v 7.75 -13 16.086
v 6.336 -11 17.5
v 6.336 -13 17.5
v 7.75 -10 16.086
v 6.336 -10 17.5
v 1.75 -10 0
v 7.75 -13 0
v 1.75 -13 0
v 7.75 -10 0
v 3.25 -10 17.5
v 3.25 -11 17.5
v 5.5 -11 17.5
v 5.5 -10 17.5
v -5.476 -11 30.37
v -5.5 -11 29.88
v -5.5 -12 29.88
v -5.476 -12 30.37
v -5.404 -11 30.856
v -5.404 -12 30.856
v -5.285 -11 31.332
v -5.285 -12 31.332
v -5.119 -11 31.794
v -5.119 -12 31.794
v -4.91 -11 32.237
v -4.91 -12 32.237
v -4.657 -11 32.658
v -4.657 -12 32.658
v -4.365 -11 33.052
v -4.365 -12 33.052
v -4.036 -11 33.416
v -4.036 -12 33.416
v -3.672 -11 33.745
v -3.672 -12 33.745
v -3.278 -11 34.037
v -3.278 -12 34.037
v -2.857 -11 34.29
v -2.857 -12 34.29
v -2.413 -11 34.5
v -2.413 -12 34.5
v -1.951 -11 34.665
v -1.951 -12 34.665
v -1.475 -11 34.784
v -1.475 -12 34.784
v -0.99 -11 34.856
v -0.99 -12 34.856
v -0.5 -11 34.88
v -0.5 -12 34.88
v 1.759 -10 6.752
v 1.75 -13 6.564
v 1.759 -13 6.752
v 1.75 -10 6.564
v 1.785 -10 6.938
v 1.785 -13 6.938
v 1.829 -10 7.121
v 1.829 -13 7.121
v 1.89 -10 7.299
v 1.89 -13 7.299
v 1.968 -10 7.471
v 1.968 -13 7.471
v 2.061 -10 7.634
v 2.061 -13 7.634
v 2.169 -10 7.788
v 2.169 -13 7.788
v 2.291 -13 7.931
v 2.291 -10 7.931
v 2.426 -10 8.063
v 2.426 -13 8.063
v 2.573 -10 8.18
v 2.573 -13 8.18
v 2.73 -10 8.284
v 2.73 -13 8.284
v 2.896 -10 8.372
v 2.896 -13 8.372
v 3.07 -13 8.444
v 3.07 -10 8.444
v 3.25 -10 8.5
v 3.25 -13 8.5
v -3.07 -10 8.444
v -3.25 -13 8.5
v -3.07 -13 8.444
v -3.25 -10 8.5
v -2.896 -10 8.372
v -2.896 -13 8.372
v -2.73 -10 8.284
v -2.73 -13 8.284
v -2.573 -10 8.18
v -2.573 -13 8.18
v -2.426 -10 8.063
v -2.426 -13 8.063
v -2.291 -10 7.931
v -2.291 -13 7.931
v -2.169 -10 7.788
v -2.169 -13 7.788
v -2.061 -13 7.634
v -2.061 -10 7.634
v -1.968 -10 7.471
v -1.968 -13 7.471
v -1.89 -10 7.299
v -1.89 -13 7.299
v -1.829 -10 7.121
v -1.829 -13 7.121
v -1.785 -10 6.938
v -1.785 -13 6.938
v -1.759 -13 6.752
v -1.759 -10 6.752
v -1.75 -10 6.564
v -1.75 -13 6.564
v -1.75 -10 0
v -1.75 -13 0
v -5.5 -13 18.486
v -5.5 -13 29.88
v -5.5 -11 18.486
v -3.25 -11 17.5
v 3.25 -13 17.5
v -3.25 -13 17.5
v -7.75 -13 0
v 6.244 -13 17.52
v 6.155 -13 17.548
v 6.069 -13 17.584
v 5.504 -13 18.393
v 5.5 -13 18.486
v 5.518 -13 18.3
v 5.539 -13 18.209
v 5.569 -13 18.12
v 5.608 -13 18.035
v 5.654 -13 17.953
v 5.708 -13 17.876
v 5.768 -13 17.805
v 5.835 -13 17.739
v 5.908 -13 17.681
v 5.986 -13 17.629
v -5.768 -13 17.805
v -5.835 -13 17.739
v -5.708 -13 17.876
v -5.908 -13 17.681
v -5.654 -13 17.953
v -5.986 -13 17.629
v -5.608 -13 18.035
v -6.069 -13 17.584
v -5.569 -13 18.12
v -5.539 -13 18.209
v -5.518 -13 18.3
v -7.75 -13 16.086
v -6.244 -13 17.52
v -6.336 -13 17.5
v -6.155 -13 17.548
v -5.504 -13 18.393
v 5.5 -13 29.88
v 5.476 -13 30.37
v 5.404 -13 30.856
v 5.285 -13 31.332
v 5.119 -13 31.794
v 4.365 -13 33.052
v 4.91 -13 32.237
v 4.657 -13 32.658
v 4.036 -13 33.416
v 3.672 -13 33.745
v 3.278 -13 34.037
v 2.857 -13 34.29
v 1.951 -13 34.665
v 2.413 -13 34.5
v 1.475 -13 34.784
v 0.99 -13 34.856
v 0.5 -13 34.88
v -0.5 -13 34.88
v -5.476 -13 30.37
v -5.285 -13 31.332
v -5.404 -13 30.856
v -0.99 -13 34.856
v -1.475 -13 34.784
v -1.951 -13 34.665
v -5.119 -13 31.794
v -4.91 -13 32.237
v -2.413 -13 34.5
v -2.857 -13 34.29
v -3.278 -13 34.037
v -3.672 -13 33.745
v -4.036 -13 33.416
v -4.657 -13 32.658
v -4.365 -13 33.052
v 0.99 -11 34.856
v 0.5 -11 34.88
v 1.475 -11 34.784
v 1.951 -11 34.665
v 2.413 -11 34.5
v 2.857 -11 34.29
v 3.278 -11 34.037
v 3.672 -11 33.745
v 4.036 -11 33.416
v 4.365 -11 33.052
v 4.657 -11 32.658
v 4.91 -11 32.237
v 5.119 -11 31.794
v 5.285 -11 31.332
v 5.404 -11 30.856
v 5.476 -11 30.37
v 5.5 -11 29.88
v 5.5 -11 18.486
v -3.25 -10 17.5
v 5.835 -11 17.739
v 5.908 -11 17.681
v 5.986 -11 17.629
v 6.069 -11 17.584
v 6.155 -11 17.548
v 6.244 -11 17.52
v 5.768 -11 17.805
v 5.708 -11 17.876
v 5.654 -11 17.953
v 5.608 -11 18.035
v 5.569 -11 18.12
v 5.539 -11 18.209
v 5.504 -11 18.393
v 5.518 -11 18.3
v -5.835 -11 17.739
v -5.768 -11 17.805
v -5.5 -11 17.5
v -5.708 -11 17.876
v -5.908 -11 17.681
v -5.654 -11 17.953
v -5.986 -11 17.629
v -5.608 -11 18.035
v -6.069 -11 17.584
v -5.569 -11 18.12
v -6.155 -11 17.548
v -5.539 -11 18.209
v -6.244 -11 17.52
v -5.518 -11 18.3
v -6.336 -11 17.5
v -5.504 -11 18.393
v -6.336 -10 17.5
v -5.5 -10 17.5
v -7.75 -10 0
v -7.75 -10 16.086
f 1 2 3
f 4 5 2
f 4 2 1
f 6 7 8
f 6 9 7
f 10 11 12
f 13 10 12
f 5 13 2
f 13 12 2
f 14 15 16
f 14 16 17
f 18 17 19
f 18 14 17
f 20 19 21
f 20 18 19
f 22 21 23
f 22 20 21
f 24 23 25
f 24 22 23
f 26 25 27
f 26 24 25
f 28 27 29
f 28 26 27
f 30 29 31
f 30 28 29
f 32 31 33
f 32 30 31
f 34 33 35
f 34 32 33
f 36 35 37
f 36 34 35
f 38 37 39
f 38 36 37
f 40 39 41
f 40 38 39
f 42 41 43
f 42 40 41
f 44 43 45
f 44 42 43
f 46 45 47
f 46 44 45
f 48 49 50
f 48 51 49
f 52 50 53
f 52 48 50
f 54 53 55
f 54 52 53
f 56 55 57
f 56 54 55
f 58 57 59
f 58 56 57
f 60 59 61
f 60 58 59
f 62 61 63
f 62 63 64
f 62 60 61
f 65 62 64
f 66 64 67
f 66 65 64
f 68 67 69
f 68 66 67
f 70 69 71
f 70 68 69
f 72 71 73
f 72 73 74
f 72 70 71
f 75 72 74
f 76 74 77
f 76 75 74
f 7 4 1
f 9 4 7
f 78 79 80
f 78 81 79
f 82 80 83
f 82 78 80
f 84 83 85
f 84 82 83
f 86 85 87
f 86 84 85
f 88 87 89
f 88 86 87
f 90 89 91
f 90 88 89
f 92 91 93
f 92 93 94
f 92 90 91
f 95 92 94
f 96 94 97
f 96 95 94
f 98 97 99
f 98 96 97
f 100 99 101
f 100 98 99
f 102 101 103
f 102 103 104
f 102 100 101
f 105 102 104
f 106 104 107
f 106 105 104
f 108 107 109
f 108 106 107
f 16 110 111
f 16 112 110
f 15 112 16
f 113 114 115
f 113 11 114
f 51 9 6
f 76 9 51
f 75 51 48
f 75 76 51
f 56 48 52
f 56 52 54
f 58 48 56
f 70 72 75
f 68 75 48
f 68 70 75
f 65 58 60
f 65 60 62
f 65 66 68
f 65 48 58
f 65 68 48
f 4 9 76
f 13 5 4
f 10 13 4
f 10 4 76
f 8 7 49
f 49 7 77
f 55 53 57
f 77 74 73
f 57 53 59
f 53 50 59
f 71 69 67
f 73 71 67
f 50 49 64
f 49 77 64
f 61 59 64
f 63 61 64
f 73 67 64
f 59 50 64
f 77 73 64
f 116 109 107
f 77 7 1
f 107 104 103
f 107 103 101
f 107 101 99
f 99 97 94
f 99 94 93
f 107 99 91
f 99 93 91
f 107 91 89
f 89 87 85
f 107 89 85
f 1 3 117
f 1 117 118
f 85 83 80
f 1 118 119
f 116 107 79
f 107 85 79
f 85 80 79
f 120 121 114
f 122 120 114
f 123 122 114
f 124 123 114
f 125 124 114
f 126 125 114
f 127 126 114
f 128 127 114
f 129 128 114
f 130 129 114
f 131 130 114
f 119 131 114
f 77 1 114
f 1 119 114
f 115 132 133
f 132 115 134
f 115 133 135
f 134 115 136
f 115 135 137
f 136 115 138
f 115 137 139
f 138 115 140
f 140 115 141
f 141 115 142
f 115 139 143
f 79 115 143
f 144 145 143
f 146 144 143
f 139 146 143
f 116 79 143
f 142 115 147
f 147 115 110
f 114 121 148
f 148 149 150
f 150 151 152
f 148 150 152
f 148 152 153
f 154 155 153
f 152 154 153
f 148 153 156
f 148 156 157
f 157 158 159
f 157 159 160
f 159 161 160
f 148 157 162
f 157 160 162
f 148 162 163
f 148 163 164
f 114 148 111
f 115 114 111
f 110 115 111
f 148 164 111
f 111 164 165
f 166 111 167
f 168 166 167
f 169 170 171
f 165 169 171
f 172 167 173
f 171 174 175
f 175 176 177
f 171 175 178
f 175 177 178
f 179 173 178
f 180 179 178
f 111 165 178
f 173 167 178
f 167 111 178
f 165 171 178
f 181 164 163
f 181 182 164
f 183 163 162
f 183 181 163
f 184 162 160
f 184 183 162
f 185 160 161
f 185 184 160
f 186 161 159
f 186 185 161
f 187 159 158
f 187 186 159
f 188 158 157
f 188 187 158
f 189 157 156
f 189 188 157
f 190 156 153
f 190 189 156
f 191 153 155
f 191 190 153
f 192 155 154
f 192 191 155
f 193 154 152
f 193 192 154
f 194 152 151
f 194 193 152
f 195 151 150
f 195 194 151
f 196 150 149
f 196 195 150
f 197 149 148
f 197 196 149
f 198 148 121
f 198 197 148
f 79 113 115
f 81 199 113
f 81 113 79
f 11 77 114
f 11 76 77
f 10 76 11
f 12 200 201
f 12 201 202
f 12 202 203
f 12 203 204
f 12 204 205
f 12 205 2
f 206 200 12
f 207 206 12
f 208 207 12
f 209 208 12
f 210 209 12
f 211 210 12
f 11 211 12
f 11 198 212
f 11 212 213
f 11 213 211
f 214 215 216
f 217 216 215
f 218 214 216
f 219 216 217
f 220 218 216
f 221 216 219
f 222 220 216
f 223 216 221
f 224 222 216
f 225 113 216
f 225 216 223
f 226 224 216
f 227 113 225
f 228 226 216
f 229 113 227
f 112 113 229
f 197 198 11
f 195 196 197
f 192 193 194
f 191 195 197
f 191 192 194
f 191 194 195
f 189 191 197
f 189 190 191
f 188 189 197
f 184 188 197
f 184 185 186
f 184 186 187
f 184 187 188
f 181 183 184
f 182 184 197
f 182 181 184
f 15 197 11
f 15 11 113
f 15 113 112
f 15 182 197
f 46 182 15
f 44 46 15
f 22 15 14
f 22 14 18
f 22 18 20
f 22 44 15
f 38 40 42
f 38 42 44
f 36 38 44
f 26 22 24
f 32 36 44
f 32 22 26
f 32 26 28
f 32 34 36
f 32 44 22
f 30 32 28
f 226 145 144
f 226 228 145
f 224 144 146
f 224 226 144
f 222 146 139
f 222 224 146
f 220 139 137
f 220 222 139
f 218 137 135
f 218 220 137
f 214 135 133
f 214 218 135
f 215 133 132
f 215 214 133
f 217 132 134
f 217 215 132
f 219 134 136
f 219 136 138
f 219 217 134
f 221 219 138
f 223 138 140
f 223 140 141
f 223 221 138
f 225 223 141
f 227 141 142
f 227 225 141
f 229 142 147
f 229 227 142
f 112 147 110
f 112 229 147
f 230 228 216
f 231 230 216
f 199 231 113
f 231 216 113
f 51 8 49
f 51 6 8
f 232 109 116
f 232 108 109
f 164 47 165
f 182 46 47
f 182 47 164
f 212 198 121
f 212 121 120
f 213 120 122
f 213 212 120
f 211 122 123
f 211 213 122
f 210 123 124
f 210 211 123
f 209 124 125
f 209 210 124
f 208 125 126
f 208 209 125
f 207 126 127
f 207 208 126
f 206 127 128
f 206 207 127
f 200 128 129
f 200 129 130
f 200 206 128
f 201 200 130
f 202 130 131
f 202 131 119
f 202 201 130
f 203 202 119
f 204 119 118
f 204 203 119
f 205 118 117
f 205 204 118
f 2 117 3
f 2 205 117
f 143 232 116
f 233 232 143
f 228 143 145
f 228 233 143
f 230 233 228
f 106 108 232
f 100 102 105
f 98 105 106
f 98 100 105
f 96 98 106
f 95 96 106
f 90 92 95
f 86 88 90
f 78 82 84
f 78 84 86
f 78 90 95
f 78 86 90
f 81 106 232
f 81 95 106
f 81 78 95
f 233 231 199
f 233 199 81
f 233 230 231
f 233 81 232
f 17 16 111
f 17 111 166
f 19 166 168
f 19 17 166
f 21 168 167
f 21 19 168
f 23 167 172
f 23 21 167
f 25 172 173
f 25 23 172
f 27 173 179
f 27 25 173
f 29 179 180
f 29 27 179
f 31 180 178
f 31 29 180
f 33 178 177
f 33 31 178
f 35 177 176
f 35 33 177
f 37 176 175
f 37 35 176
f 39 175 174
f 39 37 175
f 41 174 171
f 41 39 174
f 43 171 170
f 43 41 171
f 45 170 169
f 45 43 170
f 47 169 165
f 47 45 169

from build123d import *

# Parameters (mm, degrees)
F3_DEPTH    = 2
F4_W        = 1
F4_H        = 17.3801295459
F5_DEPTH    = 13.251
F6_R        = 5
F7_T1_DEPTH = 1
F8_T1_DEPTH = 11.6824583655
F9_DEPTH    = 1


# Not quite as in the source:
# - a fillet or chamfer that OpenCascade refuses, or shapes differently, is made with other operations: its cross-section is extruded or revolved along the edge and cut away or added


with BuildPart() as f3:
    # F2 (on line) → F3 (new body)
    with BuildSketch(Plane(origin=(0, -12, 0), x_dir=(-1, 0, 0), z_dir=(0, 1, 0))):
        Polygon((-7.75, 0), (-1.75, 0), (-1.75, 8.5), (-3.25, 8.5), (-3.25, 17.5), (-5.5, 17.5), (-6.3357864376, 17.5), (-7.75, 16.0857864376), align=None)
        Polygon((5.5, 17.5), (3.25, 17.5), (3.25, 8.5), (1.75, 8.5), (1.75, 0), (7.75, 0), (7.75, 16.0857864376), (6.3357864376, 17.5), align=None)
        Polygon((-5.5, 17.5), (-3.25, 17.5), (3.25, 17.5), (5.5, 17.5), (5.5, 34.8801295459), (0, 34.8801295459), (-5.5, 34.8801295459), align=None)
    extrude(amount=F3_DEPTH)

    # F4 (on face) → F5 (cut, through all)
    with BuildSketch(Plane.YZ.offset(5.5)):
        with Locations((-10.5, 26.190064773)):
            Rectangle(F4_W, F4_H)
    extrude(amount=-F5_DEPTH, mode=Mode.SUBTRACT)

    # F6
    f6_edges = [f3.edges().sort_by_distance(p)[0] for p in [
        (5.5, -11.5, 34.88013),
        (-5.5, -11.5, 34.88013),
    ]]
    fillet(f6_edges, radius=F6_R)

    # F7: fillet of radius 1 on 2 edges, made by hand

    # F7_s2 → F7_t1 (join)
    with BuildSketch(Plane.XZ.offset(11)):
        with BuildLine():
            ThreePointArc((5.5, 18.4864248101), (5.7370407736, 17.8399782007), (6.3357864376, 17.5))
            Line((6.3357864376, 17.5), (5.5, 17.5))
            Line((5.5, 17.5), (5.5, 18.4864248101))
        make_face()
        with BuildLine():
            ThreePointArc((-6.3357864376, 17.5), (-5.7370407736, 17.8399782007), (-5.5, 18.4864248101))
            Line((-5.5, 18.4864248101), (-5.5, 17.5))
            Line((-5.5, 17.5), (-6.3357864376, 17.5))
        make_face()
    extrude(amount=F7_T1_DEPTH)

    # F8: fillet of radius 2 on 2 edges, made by hand

    # F8_s2 → F8_t1 (cut)
    with BuildSketch(Plane.XZ.offset(5.1587708172)):
        with BuildLine():
            ThreePointArc((3.25, 8.5), (2.1688611699, 7.7882531983), (1.75, 6.5635083269))
            Line((1.75, 6.5635083269), (1.75, 8.5))
            Line((1.75, 8.5), (3.25, 8.5))
        make_face()
        with BuildLine():
            ThreePointArc((-1.75, 6.5635083269), (-2.1688611699, 7.7882531983), (-3.25, 8.5))
            Line((-3.25, 8.5), (-1.75, 8.5))
            Line((-1.75, 8.5), (-1.75, 6.5635083269))
        make_face()
    extrude(amount=F8_T1_DEPTH, mode=Mode.SUBTRACT)

    # F9 (add): a face of the model
    f9_faces = [f3.faces().sort_by_distance(p)[0] for p in [
        (-5.4458267789, -12, 17.5932359202),
    ]]
    extrude(f9_faces, amount=F9_DEPTH)


solid = f3.part
